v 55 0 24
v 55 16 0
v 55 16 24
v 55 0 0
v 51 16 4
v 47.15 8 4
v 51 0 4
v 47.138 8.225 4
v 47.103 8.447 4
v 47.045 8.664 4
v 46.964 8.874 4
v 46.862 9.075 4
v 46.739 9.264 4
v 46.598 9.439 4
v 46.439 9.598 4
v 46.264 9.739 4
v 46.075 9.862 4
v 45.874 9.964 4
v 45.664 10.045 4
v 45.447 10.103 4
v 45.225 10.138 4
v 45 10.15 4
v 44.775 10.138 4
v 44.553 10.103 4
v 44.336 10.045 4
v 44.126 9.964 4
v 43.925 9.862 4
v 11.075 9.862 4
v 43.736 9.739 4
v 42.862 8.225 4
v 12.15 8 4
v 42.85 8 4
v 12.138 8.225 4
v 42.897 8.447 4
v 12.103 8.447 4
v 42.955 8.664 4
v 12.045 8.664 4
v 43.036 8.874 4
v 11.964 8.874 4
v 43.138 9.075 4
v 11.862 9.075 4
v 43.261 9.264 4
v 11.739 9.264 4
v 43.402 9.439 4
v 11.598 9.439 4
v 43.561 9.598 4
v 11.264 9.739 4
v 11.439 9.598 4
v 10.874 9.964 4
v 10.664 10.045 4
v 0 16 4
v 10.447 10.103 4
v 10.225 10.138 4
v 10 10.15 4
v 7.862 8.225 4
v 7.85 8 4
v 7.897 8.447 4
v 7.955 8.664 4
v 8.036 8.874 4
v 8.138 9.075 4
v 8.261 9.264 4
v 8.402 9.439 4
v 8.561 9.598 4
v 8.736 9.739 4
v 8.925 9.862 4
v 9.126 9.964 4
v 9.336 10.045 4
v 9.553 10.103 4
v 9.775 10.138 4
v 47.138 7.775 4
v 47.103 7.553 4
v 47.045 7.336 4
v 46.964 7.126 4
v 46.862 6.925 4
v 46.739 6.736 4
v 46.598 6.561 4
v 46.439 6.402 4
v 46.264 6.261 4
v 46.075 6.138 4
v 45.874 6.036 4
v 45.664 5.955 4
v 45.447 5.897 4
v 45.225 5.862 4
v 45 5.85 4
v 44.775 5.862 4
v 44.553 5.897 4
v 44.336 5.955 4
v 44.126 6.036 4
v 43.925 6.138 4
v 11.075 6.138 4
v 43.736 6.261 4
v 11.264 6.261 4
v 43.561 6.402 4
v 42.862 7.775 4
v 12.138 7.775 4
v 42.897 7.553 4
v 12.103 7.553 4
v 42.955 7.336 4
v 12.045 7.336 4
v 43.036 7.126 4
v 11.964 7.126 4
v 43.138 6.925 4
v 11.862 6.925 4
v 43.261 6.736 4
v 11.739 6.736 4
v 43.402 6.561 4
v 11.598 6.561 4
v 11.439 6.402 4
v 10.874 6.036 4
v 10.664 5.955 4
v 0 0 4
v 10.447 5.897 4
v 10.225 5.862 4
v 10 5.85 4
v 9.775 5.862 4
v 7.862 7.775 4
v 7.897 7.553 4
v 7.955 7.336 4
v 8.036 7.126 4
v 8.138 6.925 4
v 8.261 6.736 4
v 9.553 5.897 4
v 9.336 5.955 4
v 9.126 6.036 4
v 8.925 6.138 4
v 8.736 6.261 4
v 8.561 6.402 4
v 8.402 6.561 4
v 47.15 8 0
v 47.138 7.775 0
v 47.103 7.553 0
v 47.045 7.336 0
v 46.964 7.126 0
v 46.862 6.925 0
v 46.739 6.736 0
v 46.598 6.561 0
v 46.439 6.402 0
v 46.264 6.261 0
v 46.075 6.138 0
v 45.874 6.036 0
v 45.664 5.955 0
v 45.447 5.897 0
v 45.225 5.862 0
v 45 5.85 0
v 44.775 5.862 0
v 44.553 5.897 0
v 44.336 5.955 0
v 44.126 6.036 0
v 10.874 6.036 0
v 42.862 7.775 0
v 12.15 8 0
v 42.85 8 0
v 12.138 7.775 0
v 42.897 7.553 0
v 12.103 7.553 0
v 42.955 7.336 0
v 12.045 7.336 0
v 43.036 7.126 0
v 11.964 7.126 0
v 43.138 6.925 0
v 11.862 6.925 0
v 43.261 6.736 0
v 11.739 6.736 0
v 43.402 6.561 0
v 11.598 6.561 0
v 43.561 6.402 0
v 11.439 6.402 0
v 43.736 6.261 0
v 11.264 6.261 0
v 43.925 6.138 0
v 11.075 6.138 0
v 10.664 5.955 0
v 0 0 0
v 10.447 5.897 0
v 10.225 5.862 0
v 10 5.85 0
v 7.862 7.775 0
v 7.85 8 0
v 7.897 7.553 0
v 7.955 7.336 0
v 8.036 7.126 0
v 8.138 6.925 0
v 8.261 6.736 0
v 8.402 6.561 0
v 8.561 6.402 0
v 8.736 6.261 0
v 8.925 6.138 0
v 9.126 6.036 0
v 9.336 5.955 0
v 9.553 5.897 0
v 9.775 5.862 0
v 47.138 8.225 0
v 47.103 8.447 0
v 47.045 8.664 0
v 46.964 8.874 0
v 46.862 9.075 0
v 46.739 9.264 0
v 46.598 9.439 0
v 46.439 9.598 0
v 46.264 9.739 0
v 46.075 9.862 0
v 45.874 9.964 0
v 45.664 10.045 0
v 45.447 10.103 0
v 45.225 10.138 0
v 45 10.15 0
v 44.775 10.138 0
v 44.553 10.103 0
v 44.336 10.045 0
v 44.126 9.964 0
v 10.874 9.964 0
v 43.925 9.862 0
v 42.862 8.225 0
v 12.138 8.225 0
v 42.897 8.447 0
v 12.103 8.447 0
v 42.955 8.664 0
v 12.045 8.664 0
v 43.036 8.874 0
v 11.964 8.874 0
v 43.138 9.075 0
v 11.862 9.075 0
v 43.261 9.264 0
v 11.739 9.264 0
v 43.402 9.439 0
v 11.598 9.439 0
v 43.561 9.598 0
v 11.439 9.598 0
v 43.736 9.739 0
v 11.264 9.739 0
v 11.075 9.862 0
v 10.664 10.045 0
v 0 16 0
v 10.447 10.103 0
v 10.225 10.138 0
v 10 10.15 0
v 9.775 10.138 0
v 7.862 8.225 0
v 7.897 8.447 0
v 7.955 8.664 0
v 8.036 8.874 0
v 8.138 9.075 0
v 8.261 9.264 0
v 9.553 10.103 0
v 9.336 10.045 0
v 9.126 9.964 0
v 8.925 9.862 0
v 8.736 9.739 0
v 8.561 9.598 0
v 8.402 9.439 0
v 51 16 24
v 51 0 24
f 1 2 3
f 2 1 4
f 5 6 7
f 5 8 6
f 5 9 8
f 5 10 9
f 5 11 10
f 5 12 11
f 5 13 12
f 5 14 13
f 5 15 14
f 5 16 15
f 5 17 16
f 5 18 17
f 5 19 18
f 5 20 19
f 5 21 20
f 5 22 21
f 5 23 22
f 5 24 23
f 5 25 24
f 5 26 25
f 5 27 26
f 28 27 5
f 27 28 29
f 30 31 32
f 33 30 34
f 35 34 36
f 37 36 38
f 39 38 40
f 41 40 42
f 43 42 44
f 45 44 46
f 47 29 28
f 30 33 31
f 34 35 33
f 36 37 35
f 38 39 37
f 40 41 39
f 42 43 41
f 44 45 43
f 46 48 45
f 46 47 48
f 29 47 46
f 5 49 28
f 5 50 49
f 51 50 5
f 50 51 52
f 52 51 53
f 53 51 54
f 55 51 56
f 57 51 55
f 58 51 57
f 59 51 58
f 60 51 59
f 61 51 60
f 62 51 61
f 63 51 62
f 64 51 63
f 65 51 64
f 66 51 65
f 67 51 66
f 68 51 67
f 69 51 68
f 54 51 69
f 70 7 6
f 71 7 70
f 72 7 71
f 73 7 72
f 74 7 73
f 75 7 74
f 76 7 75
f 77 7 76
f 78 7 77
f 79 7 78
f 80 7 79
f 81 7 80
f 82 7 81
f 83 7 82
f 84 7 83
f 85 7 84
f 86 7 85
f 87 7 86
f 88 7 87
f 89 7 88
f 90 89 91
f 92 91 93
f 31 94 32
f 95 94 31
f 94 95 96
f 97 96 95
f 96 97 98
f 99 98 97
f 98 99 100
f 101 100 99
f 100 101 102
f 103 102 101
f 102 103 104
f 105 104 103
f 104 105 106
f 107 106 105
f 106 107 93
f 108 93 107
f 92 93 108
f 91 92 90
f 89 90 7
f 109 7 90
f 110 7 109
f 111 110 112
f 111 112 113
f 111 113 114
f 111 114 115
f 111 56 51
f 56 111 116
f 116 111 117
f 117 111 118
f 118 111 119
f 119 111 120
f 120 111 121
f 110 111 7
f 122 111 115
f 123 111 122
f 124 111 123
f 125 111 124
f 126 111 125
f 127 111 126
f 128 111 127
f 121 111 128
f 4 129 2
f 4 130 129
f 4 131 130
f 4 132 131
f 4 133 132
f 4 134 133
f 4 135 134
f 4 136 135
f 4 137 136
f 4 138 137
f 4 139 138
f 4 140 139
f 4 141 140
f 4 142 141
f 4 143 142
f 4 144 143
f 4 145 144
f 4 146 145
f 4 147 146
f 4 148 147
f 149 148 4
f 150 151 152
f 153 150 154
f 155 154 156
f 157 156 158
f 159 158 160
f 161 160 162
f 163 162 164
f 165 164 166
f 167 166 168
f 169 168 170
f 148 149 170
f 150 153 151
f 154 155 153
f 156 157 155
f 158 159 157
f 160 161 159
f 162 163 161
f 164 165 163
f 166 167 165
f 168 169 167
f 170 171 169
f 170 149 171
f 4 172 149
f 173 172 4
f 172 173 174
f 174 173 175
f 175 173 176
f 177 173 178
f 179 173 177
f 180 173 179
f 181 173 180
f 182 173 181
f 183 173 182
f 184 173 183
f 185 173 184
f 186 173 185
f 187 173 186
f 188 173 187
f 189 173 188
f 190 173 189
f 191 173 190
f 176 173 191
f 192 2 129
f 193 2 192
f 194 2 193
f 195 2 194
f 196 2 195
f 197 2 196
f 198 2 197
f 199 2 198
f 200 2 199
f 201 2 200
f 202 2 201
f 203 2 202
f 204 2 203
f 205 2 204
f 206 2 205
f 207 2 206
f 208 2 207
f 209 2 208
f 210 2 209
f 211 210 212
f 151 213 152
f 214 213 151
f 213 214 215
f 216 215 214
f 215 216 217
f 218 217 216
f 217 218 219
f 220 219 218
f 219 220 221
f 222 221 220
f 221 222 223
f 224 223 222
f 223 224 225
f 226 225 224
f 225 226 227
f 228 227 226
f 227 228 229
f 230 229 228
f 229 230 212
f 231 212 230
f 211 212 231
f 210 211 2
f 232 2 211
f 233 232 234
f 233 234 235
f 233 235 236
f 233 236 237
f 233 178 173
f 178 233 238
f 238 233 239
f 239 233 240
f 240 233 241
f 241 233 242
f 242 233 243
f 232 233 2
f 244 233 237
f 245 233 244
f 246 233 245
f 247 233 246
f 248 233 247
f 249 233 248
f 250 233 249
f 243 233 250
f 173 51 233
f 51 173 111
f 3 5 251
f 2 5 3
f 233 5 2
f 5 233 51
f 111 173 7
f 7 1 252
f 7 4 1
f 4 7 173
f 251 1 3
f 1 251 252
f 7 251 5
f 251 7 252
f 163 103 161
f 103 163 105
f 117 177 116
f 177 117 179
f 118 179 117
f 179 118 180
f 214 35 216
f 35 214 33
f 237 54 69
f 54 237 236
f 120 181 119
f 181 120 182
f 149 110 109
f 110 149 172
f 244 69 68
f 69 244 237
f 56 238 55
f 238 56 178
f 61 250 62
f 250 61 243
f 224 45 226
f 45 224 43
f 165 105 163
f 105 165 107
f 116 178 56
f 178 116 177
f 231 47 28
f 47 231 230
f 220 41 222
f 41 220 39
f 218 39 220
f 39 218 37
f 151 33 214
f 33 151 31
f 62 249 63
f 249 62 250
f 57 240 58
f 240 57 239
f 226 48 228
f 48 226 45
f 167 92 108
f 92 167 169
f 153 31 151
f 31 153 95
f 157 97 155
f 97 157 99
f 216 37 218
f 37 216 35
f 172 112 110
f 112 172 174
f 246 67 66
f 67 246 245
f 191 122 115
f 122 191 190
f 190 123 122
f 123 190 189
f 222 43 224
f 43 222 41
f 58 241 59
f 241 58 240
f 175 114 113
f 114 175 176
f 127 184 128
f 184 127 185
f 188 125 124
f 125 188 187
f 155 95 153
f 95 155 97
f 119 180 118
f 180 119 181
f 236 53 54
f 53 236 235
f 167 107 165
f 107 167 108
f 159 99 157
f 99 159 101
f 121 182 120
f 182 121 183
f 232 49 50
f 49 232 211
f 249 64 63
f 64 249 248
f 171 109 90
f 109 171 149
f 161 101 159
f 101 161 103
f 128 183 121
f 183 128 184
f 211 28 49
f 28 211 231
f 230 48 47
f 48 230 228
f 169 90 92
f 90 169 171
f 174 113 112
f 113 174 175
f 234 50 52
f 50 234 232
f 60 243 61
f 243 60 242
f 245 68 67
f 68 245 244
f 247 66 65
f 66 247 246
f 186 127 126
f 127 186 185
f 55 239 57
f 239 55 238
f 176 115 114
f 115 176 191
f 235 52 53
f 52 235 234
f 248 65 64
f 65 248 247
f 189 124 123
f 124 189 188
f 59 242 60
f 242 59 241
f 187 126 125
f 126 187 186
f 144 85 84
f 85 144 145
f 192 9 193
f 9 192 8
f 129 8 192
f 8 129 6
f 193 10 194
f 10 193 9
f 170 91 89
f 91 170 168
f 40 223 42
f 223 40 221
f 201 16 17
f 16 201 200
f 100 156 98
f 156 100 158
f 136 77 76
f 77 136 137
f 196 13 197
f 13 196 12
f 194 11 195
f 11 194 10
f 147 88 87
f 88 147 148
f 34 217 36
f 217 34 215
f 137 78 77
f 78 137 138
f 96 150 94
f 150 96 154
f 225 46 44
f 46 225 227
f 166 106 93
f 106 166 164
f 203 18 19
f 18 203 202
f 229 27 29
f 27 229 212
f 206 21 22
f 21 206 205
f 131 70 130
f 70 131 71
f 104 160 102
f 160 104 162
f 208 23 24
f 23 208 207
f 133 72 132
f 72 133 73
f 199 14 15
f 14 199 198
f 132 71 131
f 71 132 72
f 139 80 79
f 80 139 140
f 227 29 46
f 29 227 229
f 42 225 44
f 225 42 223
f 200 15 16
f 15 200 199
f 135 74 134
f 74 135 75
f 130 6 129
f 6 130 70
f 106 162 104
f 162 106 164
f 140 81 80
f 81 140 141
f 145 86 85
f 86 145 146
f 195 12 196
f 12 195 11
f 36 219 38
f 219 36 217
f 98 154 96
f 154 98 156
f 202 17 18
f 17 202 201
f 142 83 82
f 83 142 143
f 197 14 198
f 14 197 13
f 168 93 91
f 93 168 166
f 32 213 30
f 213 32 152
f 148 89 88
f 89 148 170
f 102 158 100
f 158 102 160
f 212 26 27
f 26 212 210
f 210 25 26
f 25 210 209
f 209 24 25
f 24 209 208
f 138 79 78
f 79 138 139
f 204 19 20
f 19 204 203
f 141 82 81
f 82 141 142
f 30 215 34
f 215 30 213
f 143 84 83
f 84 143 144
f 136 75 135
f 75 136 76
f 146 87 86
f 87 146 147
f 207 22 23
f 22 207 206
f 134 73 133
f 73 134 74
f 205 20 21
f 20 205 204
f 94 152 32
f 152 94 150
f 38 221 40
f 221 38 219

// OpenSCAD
// Latch hook bracket.
$fn = 60;
eps = 0.02;
length = 55;
height = 20;
width = 16;
thickness = 4;
difference() { union() { cube([length,width,thickness]); translate([length-thickness,0,thickness]) cube([thickness,width,height]); } for(x=[10,length-10]) translate([x,width/2,-eps]) cylinder(d=4.3,h=thickness+2*eps); }
